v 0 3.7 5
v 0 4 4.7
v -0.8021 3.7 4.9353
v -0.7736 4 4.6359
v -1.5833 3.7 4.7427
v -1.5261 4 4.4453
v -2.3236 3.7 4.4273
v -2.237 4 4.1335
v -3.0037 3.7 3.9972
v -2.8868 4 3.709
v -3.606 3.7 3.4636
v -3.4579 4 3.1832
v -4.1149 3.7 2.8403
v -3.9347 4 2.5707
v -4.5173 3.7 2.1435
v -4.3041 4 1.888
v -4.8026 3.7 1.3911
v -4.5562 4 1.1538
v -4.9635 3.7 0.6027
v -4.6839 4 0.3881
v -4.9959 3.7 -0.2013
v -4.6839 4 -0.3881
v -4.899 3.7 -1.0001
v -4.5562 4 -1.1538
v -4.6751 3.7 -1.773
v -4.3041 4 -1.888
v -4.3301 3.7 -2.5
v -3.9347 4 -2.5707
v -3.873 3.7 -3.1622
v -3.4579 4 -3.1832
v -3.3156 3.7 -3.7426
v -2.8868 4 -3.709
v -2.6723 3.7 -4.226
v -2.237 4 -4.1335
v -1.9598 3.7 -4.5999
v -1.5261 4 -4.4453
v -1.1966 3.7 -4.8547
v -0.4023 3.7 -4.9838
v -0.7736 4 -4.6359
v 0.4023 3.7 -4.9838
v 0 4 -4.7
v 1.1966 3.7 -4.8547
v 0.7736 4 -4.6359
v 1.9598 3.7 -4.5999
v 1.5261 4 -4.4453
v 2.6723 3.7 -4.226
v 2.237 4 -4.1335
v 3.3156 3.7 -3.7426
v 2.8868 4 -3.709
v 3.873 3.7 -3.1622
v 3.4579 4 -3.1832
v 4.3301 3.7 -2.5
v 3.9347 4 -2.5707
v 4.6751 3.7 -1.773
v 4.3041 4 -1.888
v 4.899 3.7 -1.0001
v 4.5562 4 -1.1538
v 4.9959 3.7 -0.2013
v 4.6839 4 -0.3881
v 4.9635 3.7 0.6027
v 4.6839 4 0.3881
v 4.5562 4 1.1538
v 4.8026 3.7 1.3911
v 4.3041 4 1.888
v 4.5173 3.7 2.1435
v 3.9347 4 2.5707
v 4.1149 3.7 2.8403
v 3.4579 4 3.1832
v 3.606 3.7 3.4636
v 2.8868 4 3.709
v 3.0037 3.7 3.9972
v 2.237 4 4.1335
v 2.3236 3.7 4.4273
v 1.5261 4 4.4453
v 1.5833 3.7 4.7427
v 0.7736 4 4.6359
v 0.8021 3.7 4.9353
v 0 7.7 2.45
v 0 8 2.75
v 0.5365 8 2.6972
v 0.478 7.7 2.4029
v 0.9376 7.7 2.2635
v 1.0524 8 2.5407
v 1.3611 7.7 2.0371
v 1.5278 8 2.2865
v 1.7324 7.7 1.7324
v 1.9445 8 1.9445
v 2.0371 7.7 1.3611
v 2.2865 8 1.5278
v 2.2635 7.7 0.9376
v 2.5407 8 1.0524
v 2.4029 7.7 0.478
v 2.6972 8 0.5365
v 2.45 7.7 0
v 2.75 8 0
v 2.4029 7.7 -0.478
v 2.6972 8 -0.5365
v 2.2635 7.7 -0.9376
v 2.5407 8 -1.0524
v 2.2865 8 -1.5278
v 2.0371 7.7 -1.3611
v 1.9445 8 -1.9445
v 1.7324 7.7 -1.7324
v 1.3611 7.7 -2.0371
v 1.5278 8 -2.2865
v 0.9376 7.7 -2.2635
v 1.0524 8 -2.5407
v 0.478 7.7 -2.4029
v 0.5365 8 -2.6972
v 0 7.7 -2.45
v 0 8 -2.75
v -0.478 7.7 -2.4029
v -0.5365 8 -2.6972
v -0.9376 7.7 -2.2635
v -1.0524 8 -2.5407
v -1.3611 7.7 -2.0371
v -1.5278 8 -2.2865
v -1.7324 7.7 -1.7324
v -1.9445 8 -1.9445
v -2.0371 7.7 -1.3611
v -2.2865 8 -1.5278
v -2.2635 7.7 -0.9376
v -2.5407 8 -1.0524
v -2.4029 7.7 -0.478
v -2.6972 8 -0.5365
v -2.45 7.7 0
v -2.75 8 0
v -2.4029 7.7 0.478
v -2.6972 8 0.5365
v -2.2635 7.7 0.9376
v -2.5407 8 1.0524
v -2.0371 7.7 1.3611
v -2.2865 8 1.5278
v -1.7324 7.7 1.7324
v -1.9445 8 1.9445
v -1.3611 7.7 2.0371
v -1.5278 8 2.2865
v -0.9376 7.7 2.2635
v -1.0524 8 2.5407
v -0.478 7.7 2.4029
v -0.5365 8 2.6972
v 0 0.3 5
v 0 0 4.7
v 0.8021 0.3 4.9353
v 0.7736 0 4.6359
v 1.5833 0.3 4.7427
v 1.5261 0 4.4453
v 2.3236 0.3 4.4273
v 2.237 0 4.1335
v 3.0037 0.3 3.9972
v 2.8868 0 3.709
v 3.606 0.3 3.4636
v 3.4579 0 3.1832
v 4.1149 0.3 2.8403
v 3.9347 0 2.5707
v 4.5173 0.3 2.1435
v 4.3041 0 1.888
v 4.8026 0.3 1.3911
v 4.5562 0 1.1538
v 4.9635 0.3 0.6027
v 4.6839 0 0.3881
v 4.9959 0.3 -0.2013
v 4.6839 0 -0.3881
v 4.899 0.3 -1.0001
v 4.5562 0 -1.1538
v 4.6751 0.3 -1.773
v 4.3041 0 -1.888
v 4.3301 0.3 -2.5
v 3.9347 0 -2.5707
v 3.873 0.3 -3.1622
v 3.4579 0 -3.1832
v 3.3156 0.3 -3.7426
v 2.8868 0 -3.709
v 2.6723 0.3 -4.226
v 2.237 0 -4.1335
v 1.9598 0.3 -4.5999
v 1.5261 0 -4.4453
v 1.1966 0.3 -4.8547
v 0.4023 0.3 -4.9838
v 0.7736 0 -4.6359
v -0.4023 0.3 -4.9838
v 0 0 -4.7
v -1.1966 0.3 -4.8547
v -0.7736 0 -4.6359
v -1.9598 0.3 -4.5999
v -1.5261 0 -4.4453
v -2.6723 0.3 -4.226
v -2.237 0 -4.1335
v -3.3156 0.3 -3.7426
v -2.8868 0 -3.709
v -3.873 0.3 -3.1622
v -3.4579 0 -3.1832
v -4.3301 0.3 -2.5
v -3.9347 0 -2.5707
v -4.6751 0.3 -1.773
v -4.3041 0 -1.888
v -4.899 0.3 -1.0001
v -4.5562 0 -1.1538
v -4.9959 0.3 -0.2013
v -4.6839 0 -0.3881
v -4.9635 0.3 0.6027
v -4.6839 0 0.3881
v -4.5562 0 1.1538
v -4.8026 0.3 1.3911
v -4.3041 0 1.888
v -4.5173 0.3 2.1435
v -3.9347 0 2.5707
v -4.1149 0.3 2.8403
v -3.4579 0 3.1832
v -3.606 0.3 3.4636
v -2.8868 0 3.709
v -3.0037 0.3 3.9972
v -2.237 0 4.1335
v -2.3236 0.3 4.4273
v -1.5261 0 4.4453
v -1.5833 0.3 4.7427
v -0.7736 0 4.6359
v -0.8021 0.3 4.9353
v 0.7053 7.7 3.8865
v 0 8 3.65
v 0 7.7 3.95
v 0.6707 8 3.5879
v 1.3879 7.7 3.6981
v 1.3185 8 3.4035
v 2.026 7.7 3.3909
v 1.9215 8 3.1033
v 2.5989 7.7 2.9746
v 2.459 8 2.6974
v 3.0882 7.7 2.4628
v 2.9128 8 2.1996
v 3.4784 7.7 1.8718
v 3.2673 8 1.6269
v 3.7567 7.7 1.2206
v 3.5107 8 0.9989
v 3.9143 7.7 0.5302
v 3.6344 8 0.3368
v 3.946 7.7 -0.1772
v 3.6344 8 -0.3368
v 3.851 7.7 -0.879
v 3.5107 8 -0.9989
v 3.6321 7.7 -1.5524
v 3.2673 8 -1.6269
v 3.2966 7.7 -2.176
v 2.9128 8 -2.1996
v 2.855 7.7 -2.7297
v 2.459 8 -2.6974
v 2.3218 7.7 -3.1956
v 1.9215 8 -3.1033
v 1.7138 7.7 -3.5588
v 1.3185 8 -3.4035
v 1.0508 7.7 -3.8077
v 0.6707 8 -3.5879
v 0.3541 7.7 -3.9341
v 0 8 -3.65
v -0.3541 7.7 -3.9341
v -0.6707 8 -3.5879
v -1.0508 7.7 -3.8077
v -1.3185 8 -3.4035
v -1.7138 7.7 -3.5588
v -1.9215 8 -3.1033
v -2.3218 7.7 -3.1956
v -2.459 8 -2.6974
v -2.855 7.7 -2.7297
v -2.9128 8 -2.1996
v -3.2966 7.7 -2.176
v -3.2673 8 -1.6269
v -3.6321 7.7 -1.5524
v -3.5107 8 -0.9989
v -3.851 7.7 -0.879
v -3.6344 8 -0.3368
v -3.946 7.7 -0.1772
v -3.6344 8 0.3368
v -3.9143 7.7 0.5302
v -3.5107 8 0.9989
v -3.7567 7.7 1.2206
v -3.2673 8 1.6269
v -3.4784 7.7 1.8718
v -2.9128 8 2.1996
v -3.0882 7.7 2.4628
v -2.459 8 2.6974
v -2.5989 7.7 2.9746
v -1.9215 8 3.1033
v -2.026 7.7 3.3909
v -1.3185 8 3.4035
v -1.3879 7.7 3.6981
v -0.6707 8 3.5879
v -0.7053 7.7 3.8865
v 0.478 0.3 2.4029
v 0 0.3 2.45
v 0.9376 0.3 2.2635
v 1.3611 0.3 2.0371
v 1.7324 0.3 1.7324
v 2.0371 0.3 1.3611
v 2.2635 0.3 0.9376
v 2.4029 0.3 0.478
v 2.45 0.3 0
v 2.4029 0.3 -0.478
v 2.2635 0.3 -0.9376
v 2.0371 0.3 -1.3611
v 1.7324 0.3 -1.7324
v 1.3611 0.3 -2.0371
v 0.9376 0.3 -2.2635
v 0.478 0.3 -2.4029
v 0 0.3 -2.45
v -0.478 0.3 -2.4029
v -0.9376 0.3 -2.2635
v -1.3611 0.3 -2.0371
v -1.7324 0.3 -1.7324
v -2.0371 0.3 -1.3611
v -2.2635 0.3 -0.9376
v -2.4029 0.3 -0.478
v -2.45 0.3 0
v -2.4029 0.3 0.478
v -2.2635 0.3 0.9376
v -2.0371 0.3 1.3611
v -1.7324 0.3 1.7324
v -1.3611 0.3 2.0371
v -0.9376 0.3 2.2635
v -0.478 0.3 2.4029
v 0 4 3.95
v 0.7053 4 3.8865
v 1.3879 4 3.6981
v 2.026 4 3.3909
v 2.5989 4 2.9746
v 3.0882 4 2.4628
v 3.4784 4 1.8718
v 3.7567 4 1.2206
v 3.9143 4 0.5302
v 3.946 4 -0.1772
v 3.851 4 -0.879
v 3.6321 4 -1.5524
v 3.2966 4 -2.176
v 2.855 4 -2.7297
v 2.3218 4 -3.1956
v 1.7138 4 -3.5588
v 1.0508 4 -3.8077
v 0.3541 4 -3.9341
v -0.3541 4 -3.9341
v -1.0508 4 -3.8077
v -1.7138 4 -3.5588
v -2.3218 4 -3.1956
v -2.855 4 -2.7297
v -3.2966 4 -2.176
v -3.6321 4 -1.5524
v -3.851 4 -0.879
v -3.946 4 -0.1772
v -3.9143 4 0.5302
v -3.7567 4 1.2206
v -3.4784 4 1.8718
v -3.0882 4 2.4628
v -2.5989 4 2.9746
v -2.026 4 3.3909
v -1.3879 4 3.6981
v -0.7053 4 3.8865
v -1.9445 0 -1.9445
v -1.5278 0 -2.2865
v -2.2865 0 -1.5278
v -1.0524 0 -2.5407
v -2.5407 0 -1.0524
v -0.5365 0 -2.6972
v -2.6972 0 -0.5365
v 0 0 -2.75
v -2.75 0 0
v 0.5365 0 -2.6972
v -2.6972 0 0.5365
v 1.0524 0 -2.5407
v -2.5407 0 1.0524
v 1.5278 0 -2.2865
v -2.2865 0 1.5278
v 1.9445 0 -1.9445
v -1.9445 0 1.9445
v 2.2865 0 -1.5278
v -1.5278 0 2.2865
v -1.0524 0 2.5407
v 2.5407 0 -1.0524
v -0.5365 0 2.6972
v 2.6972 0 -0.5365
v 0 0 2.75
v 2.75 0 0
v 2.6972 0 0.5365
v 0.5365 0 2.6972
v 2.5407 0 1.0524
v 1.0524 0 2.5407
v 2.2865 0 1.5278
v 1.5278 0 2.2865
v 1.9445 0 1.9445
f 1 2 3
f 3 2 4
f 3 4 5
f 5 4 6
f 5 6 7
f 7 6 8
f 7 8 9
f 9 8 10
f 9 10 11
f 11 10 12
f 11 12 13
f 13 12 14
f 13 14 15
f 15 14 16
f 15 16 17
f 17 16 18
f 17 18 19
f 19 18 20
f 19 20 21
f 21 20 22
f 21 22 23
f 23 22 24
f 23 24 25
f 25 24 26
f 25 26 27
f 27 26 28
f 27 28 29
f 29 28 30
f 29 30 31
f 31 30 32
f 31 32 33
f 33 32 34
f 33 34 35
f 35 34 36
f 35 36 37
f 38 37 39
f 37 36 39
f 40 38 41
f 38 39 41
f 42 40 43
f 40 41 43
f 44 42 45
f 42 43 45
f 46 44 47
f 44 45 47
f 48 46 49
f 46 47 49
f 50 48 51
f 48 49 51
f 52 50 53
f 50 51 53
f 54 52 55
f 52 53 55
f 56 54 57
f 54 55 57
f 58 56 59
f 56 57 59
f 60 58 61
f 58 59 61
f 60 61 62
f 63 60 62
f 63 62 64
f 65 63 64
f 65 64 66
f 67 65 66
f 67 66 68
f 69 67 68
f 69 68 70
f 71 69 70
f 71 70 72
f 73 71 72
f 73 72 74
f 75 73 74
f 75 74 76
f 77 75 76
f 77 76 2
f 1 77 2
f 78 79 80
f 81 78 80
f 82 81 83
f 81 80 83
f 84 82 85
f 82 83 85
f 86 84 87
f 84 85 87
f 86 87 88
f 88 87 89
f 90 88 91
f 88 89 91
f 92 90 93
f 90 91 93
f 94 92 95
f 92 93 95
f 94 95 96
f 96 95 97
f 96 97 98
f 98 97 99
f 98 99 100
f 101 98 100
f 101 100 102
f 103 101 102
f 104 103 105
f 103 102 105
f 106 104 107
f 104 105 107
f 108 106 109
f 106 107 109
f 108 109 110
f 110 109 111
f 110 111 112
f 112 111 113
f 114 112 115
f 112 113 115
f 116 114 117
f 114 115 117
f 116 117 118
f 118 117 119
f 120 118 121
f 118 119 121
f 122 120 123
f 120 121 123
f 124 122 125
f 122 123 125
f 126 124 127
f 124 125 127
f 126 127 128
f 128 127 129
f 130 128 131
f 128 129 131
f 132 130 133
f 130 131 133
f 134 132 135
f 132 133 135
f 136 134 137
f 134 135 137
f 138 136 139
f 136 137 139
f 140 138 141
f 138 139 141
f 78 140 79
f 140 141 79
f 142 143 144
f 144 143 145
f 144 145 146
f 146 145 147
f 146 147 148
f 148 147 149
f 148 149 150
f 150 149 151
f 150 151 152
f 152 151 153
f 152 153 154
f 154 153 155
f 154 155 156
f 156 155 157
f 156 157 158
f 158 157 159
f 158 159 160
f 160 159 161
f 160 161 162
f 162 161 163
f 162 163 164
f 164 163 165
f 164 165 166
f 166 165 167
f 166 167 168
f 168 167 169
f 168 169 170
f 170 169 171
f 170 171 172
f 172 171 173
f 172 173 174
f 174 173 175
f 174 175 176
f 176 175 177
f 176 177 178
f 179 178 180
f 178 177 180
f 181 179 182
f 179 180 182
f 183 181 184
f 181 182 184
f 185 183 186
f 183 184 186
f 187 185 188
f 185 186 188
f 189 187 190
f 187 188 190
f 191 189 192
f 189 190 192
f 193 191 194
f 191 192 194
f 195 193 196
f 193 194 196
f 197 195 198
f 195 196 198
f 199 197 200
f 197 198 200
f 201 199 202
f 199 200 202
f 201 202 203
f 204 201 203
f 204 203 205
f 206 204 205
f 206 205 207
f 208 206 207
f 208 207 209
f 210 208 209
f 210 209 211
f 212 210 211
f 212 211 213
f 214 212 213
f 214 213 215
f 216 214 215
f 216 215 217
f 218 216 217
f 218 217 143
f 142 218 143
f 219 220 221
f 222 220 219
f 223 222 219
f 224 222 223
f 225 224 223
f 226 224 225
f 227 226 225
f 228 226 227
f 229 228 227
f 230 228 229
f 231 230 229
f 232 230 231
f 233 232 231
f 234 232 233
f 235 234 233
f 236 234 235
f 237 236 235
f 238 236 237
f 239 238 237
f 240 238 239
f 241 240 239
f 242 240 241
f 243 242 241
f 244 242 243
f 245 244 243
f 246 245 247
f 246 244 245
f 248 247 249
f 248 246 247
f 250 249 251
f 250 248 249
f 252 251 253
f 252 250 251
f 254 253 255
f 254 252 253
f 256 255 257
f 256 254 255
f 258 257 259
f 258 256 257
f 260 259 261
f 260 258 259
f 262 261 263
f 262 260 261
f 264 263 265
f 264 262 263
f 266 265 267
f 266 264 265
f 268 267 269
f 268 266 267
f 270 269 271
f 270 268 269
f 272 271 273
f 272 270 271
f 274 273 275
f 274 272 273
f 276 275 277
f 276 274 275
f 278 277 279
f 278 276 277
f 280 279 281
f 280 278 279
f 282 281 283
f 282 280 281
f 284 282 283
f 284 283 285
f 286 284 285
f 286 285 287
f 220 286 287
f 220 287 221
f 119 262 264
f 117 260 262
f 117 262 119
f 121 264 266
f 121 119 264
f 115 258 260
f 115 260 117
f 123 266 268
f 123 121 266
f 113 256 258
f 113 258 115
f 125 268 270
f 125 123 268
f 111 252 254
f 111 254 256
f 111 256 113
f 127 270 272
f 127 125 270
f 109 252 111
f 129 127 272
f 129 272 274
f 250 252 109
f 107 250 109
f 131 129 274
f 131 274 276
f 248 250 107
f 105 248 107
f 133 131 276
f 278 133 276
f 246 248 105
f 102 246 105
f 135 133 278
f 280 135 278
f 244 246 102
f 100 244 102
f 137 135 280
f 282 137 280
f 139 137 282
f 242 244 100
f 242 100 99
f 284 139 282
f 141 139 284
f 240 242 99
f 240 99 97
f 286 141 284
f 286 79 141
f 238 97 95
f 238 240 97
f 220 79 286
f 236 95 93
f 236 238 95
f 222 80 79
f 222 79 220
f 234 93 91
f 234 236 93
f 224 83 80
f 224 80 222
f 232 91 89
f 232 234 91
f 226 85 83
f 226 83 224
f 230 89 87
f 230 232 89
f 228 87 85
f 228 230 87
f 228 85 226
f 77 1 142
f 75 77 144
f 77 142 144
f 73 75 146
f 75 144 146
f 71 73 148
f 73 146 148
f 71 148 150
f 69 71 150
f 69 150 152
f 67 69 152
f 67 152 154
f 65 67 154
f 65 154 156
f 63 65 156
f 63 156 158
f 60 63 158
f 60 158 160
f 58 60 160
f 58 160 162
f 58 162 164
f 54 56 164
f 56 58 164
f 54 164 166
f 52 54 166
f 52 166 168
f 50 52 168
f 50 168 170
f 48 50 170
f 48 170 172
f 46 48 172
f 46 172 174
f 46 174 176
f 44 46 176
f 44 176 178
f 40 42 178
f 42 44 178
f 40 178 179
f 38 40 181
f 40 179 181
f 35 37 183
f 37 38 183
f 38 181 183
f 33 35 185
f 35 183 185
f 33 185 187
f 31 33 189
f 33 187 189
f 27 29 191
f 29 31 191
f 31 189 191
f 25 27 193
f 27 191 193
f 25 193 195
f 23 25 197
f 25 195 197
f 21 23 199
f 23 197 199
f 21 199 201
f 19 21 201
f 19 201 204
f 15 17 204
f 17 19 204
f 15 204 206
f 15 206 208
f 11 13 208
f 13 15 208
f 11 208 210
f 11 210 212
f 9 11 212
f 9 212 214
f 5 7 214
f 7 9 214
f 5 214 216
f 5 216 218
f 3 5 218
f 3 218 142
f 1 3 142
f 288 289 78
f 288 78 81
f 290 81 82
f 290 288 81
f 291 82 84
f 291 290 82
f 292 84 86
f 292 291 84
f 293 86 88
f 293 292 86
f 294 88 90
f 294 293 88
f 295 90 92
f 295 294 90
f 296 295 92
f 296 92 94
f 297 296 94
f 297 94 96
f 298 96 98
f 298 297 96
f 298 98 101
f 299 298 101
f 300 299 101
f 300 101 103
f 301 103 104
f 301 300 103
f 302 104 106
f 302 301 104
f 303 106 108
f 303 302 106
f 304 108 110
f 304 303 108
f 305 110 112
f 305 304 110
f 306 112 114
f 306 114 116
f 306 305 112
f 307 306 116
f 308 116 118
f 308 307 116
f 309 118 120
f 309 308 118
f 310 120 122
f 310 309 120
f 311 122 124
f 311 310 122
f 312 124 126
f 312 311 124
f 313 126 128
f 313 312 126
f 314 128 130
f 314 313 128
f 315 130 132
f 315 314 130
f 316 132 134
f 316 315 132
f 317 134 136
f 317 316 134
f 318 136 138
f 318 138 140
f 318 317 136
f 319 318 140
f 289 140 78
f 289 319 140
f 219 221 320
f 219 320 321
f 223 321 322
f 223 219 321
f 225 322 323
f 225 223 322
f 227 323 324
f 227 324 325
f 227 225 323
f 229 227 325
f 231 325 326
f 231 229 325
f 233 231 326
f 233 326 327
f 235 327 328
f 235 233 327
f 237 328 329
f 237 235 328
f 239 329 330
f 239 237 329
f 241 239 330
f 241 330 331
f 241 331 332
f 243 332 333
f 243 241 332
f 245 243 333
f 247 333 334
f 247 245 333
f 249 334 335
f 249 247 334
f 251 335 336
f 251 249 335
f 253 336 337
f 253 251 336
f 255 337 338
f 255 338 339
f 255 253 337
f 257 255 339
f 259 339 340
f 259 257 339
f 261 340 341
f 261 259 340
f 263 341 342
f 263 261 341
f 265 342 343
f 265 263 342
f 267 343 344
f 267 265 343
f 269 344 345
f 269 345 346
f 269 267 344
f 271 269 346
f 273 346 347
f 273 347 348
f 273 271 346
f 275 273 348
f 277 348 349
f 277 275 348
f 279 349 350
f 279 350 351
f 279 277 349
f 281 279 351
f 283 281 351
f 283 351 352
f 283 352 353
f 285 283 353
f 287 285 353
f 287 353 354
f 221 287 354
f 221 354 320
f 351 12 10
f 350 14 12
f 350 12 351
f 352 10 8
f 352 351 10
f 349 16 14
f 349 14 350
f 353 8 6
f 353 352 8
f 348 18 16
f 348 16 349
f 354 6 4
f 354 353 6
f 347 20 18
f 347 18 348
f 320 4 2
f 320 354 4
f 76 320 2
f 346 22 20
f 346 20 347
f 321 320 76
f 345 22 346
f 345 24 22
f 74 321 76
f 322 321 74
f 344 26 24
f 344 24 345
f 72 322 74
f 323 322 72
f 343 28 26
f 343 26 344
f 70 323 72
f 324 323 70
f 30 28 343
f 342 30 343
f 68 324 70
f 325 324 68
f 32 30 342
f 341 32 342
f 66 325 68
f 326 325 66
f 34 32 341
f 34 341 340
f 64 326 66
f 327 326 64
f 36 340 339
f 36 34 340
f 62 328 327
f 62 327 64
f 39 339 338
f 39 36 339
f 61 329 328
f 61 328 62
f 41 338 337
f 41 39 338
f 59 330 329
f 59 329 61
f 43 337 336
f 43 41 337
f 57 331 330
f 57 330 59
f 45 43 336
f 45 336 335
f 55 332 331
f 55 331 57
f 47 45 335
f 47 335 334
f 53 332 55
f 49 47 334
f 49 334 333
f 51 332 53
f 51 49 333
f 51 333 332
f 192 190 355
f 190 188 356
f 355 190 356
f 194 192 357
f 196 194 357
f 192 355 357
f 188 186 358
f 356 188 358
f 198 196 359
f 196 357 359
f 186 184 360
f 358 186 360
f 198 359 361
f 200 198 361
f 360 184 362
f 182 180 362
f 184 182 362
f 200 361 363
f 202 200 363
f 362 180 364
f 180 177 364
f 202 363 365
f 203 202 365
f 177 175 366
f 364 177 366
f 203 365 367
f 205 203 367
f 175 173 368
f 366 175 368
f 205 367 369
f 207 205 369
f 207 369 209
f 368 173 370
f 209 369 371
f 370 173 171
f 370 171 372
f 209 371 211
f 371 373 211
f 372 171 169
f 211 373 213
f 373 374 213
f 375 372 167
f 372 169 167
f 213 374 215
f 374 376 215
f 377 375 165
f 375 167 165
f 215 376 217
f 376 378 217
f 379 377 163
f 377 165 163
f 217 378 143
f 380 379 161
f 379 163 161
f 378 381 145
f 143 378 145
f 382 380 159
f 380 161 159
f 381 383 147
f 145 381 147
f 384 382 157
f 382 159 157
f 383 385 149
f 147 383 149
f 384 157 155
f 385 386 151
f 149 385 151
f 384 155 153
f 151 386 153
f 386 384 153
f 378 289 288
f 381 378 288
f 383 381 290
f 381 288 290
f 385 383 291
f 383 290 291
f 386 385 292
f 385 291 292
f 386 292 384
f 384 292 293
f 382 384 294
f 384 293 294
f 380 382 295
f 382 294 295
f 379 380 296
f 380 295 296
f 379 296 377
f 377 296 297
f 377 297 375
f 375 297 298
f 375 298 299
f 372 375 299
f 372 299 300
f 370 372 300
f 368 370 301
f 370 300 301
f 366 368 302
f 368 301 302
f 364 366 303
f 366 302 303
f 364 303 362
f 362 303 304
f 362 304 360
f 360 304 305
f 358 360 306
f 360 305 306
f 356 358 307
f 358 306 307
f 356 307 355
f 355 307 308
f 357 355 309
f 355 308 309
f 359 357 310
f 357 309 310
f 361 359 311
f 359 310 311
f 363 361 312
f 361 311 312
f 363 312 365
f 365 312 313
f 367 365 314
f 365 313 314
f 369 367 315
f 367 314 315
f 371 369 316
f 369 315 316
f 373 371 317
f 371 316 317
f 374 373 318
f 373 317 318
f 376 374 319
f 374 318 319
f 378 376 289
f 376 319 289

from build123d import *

# Parameters (mm, degrees)
SKETCH1_R           = 5
SKETCH1_R_2         = 2.45
BOSS_EXTRUDE1_DEPTH = 8
SKETCH2_R           = 10
SKETCH2_R_2         = 3.95
CUT_EXTRUDE1_DEPTH  = 4
CHAMFER1_SIZE       = 0.3


with BuildPart() as part:
    # Sketch1 → Boss-Extrude1 (new body)
    with BuildSketch(Plane(origin=(0, 0, 0), x_dir=(1, 0, 0), z_dir=(0, 1, 0))):
        with Locations(Location((0, 0, 0), (0, 0, 270))):
            Circle(SKETCH1_R)
        with Locations(Location((0, 0, 0), (0, 0, 270))):
            Circle(SKETCH1_R_2, mode=Mode.SUBTRACT)
    extrude(amount=BOSS_EXTRUDE1_DEPTH)

    # Sketch2 → Cut-Extrude1 (cut)
    with BuildSketch(Plane(origin=(0, 8, 0), x_dir=(1, 0, 0), z_dir=(0, 1, 0))):
        Circle(SKETCH2_R)
        with Locations(Location((0, 0, 0), (0, 0, 270))):
            Circle(SKETCH2_R_2, mode=Mode.SUBTRACT)
    extrude(amount=-CUT_EXTRUDE1_DEPTH, mode=Mode.SUBTRACT)

    # Chamfer1
    chamfer1_edges = [part.edges().sort_by_distance(p)[0] for p in [
        (0, 8, -3.95),
        (0, 4, -5),
        (0, 0, -5),
        (0, 0, -2.45),
        (0, 8, -2.45),
    ]]
    chamfer(chamfer1_edges, length=CHAMFER1_SIZE)


solid = part.part
